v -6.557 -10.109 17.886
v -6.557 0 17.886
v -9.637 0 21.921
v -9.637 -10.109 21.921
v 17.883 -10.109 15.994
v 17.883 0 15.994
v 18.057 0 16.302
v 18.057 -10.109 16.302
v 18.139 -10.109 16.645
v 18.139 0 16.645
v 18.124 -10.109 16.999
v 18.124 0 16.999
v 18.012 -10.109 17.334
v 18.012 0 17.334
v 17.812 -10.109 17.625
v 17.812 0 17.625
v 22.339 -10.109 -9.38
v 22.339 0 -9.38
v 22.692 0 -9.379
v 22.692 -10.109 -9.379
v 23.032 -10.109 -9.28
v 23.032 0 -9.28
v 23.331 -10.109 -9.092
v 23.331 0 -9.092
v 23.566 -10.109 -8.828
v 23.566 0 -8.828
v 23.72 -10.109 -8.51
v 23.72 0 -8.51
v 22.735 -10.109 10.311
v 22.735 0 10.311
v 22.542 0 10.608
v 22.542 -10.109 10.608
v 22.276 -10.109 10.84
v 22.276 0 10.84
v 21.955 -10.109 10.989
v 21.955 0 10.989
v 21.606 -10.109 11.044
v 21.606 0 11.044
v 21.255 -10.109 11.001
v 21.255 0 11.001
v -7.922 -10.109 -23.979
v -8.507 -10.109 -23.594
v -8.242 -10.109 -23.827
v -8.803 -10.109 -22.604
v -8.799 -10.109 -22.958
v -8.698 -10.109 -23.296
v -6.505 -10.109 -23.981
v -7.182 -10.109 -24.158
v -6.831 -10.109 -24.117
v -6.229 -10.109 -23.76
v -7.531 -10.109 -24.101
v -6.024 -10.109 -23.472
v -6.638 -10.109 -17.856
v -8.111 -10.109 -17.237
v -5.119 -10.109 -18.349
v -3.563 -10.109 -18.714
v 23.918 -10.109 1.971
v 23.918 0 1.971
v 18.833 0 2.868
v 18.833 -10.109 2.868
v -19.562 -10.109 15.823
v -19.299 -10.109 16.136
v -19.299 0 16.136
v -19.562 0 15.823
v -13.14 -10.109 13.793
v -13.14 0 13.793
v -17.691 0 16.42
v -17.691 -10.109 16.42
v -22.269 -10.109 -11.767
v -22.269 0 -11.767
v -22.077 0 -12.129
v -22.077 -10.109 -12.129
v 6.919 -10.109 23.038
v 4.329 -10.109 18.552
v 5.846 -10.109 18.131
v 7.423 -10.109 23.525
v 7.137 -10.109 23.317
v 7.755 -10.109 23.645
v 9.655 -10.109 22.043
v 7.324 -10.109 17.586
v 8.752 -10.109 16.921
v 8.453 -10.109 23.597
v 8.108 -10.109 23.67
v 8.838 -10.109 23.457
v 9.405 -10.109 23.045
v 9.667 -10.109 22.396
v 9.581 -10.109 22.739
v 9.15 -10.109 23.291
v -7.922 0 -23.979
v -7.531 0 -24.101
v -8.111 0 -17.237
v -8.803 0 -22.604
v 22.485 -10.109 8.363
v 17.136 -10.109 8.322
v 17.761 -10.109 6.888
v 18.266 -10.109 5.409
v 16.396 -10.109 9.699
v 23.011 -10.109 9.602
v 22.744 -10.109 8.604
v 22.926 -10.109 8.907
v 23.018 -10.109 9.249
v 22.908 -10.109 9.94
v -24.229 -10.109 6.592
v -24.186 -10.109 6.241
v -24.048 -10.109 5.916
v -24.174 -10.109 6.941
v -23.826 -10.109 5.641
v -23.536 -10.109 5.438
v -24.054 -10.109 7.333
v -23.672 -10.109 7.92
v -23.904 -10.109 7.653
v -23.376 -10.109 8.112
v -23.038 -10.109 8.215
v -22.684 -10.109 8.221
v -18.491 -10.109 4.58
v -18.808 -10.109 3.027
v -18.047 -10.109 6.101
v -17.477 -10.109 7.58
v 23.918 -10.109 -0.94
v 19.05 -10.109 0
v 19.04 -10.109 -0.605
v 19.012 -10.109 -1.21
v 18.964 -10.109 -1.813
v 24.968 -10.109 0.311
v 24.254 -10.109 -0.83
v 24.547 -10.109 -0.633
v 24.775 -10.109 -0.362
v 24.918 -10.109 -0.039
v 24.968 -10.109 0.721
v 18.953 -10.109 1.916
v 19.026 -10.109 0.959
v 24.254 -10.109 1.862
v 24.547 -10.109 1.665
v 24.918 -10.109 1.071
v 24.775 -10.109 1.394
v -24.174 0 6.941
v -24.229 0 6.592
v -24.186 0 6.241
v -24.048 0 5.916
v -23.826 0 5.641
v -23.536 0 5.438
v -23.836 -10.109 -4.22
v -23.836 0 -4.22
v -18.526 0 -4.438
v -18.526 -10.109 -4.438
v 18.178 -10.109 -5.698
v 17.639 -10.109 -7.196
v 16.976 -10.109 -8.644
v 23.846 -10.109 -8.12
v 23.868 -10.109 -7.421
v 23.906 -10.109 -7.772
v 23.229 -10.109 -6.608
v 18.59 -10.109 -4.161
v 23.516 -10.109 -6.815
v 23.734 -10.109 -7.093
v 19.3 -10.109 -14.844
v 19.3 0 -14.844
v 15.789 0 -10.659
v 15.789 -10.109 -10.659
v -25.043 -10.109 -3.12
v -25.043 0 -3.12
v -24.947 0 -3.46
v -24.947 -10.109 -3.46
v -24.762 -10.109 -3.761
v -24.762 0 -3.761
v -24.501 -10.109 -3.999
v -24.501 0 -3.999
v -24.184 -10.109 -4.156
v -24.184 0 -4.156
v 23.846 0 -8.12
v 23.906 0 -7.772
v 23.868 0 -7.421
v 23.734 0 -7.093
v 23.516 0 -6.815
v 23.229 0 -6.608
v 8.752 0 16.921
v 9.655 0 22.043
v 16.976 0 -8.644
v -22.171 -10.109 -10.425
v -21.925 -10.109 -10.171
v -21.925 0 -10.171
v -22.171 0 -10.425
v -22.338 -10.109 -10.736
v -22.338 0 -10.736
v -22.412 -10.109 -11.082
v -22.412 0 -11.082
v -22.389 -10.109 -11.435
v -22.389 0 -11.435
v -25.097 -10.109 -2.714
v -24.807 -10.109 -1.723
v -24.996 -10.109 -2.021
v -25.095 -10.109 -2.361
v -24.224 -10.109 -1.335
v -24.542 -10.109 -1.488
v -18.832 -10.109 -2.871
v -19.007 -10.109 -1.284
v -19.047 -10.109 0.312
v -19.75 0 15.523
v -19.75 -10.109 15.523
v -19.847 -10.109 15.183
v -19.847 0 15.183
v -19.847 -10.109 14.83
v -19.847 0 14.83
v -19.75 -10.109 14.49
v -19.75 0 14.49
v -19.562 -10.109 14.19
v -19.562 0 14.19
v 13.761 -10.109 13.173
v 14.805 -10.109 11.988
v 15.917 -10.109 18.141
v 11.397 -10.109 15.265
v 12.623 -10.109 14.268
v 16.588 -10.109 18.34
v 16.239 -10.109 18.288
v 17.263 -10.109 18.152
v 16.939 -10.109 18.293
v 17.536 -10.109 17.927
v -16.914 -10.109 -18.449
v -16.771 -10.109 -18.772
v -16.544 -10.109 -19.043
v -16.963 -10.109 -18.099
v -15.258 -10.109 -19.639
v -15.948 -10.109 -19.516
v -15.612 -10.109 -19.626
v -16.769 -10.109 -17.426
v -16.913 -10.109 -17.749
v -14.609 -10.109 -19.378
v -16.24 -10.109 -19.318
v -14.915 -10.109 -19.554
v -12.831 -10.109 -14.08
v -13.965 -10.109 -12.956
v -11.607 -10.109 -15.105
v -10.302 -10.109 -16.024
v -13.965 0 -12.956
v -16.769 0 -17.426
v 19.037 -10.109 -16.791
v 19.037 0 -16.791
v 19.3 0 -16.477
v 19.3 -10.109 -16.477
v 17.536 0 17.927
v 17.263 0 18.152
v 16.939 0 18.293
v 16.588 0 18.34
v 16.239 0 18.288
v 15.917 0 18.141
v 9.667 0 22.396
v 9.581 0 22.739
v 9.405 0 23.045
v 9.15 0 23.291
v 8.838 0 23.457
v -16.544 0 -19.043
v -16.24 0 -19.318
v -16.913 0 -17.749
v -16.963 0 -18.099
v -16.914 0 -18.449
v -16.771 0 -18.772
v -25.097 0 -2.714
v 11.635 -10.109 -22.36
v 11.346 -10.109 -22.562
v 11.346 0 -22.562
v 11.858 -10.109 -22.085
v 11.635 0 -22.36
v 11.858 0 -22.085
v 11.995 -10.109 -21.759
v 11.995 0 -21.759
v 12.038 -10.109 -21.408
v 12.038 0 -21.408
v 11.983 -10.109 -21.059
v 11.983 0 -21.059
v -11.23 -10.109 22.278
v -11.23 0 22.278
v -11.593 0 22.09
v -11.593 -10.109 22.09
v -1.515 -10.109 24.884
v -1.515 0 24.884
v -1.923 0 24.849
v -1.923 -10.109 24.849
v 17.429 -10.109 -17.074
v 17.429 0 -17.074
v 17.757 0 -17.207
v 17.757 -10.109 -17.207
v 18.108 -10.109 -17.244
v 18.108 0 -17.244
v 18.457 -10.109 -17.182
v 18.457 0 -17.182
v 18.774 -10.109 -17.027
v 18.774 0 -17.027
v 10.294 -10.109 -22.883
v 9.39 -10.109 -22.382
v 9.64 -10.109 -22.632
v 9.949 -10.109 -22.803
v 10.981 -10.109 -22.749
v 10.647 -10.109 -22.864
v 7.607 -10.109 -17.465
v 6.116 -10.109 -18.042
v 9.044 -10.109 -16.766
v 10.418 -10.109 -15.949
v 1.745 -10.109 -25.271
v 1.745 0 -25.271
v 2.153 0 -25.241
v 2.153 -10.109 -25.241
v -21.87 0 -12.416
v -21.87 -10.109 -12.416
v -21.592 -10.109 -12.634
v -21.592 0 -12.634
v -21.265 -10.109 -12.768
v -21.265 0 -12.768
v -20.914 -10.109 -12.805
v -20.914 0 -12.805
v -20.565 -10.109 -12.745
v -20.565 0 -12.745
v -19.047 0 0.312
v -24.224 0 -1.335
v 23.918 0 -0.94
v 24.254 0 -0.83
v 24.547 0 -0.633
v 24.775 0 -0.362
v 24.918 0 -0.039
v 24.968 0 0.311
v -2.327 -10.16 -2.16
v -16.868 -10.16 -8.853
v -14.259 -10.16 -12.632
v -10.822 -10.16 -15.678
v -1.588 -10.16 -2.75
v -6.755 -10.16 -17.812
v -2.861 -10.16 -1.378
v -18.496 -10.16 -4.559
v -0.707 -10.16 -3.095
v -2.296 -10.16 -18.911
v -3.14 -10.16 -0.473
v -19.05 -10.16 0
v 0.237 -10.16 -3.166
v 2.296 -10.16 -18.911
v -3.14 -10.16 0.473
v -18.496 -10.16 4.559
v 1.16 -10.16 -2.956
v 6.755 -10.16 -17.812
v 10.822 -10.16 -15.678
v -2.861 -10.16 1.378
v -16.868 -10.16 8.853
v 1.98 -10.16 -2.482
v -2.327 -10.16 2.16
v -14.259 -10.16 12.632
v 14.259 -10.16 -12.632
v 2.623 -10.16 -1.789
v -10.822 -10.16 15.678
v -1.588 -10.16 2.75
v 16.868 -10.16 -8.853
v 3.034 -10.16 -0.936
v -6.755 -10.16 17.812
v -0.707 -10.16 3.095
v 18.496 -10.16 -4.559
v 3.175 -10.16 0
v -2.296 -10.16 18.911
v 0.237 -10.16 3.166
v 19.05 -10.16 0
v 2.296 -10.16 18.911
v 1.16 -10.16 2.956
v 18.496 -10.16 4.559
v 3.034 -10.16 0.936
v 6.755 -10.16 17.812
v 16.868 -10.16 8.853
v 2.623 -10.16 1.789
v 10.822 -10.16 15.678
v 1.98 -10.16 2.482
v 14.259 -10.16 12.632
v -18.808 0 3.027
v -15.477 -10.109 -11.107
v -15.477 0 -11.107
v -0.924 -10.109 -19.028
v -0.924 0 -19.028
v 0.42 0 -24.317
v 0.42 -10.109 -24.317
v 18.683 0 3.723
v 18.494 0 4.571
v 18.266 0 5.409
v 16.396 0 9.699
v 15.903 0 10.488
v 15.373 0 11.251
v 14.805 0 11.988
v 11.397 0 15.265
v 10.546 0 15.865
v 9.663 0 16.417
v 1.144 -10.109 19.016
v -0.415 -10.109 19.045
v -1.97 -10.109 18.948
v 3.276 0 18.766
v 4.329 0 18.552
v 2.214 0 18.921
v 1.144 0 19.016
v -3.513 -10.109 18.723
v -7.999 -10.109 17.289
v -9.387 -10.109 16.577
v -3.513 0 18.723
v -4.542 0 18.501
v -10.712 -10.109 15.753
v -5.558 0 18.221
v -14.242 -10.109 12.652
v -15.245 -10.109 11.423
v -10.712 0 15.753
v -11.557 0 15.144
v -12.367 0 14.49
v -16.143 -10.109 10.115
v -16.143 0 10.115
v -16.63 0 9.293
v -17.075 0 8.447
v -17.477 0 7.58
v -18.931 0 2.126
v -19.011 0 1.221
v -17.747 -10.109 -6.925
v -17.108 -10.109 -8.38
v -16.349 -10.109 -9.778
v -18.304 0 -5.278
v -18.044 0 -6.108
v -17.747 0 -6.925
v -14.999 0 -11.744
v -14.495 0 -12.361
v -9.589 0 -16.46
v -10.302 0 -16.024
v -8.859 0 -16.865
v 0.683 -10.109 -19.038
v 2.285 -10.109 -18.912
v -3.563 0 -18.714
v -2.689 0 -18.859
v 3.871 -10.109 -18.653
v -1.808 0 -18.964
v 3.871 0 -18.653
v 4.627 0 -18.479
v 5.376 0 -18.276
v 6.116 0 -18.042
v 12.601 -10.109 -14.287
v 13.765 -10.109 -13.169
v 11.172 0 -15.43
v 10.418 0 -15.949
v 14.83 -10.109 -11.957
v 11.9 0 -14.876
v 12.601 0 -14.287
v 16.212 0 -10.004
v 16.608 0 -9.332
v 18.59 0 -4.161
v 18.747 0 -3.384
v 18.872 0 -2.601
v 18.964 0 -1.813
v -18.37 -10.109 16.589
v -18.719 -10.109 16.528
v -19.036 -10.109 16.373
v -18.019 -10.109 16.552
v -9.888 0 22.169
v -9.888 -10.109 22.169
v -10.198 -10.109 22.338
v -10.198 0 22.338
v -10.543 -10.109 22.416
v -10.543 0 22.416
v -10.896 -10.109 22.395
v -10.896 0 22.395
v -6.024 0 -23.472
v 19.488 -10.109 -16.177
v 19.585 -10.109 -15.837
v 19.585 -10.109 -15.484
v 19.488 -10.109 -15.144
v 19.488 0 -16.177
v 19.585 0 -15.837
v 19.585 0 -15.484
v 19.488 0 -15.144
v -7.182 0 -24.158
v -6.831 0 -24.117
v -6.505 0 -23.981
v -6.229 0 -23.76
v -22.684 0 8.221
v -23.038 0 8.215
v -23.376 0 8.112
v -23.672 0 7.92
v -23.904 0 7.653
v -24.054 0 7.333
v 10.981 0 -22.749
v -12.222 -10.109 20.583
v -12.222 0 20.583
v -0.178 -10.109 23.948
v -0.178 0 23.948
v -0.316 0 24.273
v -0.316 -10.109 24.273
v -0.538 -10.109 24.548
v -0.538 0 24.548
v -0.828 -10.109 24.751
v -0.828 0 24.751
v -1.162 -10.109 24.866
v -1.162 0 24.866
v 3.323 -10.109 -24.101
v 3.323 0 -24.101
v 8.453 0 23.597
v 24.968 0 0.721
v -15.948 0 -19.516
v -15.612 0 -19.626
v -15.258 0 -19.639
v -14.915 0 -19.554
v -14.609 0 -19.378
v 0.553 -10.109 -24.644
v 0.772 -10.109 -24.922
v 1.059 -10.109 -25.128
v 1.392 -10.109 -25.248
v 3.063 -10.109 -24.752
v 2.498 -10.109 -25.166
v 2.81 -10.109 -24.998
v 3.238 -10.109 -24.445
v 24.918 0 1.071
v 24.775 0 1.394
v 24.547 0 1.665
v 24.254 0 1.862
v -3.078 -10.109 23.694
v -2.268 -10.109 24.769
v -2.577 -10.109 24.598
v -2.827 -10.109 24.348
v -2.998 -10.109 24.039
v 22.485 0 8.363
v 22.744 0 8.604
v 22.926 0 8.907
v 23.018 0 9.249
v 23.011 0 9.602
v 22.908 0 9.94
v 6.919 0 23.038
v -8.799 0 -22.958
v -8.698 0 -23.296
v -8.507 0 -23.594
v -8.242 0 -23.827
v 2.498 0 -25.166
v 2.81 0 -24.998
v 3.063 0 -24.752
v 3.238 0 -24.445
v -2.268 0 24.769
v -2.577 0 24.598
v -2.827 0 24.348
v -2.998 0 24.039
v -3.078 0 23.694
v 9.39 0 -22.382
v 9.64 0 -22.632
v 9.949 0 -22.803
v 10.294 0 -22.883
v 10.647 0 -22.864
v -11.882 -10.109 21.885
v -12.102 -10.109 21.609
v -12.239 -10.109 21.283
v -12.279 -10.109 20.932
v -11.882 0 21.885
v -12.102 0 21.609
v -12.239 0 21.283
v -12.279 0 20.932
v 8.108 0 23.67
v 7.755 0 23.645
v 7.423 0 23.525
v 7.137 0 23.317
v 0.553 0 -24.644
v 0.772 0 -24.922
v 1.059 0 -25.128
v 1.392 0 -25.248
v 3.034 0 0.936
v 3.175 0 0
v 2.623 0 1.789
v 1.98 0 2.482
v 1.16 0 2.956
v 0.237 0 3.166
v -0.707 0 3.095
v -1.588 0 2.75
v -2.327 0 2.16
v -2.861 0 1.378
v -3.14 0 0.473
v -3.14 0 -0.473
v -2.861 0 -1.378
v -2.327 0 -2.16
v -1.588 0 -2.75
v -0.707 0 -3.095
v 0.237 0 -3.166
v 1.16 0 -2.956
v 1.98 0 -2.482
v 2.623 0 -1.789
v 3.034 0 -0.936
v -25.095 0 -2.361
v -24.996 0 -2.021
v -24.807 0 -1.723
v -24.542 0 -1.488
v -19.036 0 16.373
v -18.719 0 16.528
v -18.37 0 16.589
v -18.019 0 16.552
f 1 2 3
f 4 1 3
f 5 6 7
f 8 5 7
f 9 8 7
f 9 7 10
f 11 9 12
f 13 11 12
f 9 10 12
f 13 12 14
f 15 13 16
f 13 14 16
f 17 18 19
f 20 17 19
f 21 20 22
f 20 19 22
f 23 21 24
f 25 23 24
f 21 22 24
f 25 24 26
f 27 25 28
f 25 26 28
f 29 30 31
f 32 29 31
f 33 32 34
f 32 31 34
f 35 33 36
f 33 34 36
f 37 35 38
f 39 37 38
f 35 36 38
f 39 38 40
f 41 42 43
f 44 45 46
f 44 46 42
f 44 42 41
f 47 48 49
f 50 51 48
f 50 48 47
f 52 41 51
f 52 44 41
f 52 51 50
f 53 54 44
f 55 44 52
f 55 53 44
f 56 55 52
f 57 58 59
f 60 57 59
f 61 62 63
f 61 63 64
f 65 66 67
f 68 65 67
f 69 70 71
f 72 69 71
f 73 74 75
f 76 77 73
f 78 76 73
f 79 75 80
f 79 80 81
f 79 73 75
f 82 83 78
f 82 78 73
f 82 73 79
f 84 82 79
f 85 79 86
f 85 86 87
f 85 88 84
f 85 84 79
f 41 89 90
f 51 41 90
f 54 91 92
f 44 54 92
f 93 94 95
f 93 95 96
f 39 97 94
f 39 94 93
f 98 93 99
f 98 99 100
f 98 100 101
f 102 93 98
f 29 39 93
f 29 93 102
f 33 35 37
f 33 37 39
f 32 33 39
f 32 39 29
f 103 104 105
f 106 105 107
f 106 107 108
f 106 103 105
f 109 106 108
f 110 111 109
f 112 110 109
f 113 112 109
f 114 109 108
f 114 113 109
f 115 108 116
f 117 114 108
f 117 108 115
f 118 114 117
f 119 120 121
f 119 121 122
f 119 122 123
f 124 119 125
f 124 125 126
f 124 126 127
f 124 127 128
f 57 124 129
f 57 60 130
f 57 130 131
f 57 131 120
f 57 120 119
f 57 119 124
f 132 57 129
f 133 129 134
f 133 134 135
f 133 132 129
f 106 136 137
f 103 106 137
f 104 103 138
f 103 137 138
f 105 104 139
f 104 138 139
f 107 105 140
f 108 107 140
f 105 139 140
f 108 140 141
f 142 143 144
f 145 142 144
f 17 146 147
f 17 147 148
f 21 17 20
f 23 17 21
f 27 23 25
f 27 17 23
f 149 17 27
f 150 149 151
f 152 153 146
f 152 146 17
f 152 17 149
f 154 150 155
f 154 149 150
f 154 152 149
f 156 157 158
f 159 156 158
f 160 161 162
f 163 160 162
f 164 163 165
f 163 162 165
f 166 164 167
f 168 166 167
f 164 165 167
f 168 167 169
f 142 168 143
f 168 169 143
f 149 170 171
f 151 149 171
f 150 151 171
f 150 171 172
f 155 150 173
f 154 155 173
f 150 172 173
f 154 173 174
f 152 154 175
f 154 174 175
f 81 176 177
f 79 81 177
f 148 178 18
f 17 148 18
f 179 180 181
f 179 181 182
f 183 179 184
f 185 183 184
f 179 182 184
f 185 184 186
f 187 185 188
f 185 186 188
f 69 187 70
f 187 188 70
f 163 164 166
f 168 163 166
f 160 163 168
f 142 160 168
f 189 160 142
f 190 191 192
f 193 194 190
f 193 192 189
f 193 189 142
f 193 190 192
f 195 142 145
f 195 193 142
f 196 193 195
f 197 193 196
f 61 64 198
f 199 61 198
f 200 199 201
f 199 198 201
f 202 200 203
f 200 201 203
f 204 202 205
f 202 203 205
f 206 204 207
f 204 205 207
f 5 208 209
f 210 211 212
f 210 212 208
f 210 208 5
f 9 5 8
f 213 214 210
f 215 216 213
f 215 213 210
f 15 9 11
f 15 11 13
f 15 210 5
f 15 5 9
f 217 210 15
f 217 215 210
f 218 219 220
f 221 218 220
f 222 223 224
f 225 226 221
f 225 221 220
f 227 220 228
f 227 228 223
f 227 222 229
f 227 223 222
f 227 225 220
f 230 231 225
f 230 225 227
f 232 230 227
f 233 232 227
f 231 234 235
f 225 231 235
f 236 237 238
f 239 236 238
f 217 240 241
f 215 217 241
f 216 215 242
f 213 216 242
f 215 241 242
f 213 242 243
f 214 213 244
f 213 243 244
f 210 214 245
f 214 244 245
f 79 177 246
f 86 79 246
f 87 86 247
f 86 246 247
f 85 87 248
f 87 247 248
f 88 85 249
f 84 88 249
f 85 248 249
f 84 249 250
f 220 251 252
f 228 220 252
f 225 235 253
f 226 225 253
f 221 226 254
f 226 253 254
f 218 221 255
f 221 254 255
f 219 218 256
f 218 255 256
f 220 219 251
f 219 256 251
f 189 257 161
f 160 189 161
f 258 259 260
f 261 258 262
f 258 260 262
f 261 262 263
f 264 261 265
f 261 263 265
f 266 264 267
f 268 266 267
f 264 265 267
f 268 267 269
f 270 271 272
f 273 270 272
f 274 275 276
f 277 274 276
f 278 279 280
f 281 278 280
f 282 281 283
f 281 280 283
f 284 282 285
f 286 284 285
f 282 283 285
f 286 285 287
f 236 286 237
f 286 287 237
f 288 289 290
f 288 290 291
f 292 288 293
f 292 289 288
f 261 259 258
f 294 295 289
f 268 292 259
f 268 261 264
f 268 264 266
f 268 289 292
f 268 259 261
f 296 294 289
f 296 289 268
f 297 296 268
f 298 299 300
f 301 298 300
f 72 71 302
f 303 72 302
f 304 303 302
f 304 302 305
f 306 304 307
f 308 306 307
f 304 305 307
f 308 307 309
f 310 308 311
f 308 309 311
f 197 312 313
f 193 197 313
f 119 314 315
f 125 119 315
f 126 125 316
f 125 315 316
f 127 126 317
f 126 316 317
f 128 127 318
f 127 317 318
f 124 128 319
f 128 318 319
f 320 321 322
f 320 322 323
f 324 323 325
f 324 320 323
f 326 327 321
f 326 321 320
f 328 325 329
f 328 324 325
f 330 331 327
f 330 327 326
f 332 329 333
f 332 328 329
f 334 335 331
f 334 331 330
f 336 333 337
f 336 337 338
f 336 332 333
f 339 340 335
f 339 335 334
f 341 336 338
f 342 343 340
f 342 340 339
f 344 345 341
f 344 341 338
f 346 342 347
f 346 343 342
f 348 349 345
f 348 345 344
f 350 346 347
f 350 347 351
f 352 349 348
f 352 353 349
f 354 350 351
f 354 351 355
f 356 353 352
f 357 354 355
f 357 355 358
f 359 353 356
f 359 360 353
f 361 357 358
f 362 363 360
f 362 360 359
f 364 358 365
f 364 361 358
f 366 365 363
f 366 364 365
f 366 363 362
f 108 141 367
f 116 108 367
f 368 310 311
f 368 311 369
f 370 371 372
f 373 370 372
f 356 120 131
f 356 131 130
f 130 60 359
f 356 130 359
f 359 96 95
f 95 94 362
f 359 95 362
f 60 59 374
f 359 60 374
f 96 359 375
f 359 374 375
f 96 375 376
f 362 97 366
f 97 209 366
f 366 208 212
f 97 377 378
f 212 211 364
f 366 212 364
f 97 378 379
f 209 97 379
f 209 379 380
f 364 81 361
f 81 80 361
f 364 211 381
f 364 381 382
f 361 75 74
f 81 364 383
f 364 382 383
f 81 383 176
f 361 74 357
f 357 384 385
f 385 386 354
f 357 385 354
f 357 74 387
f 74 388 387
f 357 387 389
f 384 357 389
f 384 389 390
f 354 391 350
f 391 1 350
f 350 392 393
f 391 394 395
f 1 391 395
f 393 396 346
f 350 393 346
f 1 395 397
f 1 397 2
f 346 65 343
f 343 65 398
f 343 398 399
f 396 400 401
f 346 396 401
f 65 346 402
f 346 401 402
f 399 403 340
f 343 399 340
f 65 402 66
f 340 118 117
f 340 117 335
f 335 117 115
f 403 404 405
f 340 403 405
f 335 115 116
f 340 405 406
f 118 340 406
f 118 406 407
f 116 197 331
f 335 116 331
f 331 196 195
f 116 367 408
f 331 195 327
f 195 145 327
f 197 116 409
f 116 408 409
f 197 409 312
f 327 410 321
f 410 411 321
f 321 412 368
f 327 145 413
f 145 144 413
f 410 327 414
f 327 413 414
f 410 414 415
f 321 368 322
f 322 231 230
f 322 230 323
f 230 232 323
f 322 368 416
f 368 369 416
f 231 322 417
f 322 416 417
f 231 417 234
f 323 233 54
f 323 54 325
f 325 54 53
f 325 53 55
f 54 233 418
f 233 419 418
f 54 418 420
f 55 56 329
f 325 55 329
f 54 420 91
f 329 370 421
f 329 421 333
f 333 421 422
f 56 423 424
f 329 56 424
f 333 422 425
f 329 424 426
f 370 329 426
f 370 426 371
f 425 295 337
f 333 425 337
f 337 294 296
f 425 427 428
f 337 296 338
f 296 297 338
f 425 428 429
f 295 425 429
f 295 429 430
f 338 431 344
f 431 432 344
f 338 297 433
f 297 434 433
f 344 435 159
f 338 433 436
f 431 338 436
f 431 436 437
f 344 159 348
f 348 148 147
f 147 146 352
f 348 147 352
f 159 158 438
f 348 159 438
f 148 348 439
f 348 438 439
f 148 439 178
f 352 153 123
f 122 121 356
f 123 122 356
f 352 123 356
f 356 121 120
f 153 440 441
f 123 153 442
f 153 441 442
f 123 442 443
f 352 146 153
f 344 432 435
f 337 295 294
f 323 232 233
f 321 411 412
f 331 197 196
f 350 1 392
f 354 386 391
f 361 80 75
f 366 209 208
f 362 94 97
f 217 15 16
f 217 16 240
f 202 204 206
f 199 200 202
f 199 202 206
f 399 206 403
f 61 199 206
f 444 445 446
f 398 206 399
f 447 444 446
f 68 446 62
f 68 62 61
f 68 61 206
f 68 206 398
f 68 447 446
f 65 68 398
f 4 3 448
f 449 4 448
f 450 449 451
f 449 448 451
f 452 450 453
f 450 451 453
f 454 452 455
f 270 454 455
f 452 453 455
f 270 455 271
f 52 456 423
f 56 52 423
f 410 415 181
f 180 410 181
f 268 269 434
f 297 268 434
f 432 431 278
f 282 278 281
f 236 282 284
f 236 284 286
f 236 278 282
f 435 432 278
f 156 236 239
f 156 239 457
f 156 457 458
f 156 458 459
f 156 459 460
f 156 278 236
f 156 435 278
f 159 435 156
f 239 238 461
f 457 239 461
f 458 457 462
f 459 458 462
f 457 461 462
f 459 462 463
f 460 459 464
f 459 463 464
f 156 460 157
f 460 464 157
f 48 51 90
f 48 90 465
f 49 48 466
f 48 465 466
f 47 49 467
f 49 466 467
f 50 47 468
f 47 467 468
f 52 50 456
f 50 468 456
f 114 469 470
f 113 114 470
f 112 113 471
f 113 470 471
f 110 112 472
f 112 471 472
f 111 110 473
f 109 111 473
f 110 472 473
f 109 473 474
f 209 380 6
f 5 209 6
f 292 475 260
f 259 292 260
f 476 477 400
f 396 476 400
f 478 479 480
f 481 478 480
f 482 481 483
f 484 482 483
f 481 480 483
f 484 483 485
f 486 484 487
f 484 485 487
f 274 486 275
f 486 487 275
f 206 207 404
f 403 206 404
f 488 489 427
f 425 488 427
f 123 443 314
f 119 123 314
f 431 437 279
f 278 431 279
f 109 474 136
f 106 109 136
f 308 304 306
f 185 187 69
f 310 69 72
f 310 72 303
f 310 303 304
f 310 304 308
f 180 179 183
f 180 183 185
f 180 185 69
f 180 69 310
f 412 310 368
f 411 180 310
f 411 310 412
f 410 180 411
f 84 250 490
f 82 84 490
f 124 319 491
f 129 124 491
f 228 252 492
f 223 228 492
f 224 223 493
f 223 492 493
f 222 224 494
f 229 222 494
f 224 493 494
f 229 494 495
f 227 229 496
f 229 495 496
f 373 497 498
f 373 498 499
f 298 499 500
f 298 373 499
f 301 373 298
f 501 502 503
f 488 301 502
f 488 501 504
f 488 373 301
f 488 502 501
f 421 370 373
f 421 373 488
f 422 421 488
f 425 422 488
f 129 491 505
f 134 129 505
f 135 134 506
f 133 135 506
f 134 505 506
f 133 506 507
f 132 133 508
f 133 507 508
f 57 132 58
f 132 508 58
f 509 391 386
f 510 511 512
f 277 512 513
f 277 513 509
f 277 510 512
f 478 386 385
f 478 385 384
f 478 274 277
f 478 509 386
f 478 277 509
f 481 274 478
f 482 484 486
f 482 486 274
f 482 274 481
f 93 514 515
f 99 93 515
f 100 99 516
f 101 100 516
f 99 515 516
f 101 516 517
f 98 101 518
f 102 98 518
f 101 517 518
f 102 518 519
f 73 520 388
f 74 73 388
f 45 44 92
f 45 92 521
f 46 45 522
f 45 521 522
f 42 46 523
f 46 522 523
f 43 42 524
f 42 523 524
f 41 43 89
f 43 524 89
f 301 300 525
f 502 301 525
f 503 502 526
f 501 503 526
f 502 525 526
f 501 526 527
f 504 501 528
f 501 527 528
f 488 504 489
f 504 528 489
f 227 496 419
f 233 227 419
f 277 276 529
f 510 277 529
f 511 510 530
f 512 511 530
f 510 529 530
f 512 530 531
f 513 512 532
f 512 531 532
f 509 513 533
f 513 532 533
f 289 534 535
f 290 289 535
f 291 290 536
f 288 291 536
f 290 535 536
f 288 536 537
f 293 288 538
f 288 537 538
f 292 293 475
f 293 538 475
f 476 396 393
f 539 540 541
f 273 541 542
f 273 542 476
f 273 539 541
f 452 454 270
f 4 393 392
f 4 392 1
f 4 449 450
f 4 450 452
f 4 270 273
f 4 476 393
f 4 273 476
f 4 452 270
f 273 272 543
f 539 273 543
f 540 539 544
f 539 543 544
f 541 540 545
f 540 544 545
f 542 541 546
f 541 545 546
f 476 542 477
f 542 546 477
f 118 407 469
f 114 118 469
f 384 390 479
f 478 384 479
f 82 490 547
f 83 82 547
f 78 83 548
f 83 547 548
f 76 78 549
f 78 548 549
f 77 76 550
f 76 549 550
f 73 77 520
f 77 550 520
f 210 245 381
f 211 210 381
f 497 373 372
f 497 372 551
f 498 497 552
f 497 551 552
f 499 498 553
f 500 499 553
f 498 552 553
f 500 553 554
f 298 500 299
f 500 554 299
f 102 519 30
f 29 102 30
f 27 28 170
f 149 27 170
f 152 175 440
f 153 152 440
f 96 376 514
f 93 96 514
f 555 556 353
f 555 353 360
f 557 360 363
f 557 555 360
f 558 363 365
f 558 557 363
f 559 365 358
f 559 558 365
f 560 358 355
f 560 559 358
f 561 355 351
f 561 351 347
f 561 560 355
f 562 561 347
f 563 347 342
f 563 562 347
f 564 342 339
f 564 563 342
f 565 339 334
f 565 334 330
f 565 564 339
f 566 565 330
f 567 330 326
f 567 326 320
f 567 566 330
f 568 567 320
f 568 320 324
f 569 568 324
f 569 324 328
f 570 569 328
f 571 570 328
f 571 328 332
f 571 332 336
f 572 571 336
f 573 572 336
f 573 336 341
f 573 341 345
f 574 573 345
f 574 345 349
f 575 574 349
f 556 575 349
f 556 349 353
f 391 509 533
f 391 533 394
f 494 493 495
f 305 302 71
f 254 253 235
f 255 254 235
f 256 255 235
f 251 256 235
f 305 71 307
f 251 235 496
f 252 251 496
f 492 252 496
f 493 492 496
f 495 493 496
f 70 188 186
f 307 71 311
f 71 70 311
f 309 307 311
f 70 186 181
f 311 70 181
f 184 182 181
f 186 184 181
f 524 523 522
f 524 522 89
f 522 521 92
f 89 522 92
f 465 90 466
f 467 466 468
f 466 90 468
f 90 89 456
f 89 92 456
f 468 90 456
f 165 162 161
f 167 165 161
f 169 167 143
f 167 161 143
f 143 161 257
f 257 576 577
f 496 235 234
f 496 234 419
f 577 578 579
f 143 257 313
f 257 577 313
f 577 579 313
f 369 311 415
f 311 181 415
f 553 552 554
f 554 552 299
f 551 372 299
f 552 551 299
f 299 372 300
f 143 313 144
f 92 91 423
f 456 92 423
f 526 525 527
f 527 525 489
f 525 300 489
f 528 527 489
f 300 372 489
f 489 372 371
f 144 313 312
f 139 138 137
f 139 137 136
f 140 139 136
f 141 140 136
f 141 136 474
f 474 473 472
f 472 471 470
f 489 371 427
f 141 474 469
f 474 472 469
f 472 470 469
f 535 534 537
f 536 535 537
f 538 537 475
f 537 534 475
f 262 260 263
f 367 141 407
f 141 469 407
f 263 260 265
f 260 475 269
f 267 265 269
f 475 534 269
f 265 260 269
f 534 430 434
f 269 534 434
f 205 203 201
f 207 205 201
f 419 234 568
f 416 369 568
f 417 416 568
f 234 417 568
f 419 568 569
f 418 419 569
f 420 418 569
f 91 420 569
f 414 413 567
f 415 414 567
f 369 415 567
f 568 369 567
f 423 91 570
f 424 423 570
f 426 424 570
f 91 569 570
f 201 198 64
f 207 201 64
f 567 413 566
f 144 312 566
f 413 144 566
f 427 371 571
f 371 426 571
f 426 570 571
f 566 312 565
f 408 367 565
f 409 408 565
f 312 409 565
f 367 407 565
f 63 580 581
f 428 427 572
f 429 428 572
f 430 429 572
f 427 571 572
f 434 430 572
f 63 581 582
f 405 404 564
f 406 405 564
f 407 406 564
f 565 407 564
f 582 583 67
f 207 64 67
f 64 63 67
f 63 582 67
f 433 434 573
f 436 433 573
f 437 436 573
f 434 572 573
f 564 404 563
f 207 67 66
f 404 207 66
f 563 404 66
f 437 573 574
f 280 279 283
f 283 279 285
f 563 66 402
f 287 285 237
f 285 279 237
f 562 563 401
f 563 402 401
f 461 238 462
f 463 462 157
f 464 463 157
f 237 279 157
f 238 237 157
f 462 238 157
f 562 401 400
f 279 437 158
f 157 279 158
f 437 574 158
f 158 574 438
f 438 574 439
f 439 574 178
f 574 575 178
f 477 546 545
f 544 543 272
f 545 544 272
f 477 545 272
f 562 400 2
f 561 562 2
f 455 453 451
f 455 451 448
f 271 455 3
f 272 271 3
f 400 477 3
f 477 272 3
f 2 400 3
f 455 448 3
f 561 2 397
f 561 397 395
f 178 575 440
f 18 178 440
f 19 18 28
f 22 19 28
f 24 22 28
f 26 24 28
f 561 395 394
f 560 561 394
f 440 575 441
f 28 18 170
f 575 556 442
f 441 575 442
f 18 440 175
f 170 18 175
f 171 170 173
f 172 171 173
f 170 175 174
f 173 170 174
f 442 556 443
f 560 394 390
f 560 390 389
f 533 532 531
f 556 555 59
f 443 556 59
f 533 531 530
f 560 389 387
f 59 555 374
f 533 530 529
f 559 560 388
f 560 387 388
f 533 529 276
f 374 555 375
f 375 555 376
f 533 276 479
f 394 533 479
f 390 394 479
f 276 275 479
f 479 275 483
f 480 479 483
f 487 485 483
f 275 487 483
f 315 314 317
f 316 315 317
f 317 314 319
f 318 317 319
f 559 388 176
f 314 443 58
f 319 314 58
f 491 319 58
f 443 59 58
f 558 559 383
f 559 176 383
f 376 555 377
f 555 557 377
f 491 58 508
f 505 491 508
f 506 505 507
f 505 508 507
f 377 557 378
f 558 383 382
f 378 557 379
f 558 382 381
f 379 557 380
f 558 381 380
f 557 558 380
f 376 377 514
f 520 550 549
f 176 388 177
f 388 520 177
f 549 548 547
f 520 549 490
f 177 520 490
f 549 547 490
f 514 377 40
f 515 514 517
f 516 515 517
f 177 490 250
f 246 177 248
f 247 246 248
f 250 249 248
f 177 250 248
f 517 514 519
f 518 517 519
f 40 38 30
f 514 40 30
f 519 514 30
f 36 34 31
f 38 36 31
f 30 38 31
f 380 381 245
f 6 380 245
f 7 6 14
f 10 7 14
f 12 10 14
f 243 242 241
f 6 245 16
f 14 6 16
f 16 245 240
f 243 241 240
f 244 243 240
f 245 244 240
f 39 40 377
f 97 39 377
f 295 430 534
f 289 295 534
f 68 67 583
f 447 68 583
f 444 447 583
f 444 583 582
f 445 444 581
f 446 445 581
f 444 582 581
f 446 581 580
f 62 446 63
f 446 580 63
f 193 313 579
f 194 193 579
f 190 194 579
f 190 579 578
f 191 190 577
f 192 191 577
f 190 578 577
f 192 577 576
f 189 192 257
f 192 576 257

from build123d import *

# Parameters (mm, degrees)
F0_R     = 19.05
F0_R_2   = 3.175
F1_DEPTH = 3.81
F3_DEPTH = 3.7338
F5_DEPTH = 6.35
F6_DEPTH = 10.1092


with BuildPart() as f1:
    # F0 (on Front) → F1 (new body)
    with BuildSketch(Plane.XZ):
        Circle(F0_R)
        Circle(F0_R_2, mode=Mode.SUBTRACT)
    extrude(amount=F1_DEPTH)

    # F2 (on Front) → F3, piece 2 (join)
    with BuildSketch(Plane.XZ):
        with BuildLine():
            Line((19.3002153026, -14.8442822065), (15.2105484158, -9.9704070017))
            Line((15.2105484158, -9.9704070017), (11.9190644701, -13.8930448189))
            Line((11.9190644701, -13.8930448189), (17.4290577612, -17.0742409287))
            ThreePointArc((17.4290577612, -17.0742409287), (18.2845909468, -17.2250945122), (19.036934204, -16.7907289302))
            Line((19.036934204, -16.7907289302), (19.3002153026, -16.4769627351))
            ThreePointArc((19.3002153026, -16.4769627351), (19.5973388598, -15.6606224708), (19.3002153026, -14.8442822065))
        make_face()
        with BuildLine():
            Line((11.9828917218, -21.0592770188), (10.1196430624, -14.9758290499))
            Line((10.1196430624, -14.9758290499), (5.5582912351, -17.3028493588))
            Line((5.5582912351, -17.3028493588), (9.3898339973, -22.3821519505))
            ThreePointArc((9.3898339973, -22.3821519505), (10.1186515435, -22.8549297204), (10.9808538675, -22.7486236155))
            Line((10.9808538675, -22.7486236155), (11.3457098838, -22.5624885854))
            ThreePointArc((11.3457098838, -22.5624885854), (11.9378629358, -21.9268404135), (11.9828917218, -21.0592770188))
        make_face()
        with BuildLine():
            Line((3.3225191024, -24.1014032107), (3.9599463344, -17.7710223943))
            Line((3.9599463344, -17.7710223943), (-1.1466123432, -18.1505121598))
            Line((-1.1466123432, -18.1505121598), (0.4195197448, -24.3171372529))
            ThreePointArc((0.4195197448, -24.3171372529), (0.9084468903, -25.0352208705), (1.7445620653, -25.2710285242))
            Line((1.7445620653, -25.2710285242), (2.1530283986, -25.24067368))
            ThreePointArc((2.1530283986, -25.24067368), (2.9451040203, -24.8838683481), (3.3225191024, -24.1014032107))
        make_face()
        with BuildLine():
            Line((-6.024496716, -23.4720864394), (-3.1015451532, -17.8208574653))
            Line((-3.1015451532, -17.8208574653), (-7.9892249639, -16.2939193272))
            Line((-7.9892249639, -16.2939193272), (-8.8030668347, -22.604045805))
            ThreePointArc((-8.8030668347, -22.604045805), (-8.6128057983, -23.4516863972), (-7.9222045185, -23.9787193257))
            Line((-7.9222045185, -23.9787193257), (-7.531245993, -24.100856926))
            ThreePointArc((-7.531245993, -24.100856926), (-6.6634444839, -24.0606776264), (-6.024496716, -23.4720864394))
        make_face()
        with BuildLine():
            Line((-14.6087634205, -19.377536382), (-9.5885228366, -15.4689280316))
            Line((-9.5885228366, -15.4689280316), (-13.3881088706, -12.0361303417))
            Line((-13.3881088706, -12.0361303417), (-16.7687691136, -17.4260441702))
            ThreePointArc((-16.7687691136, -17.4260441702), (-16.9508230748, -18.275485275), (-16.5442742828, -19.0432169437))
            Line((-16.5442742828, -19.0432169437), (-16.2403508241, -19.3178015268))
            ThreePointArc((-16.2403508241, -19.3178015268), (-15.4354279769, -19.6445935792), (-14.6087634205, -19.377536382))
        make_face()
        with BuildLine():
            Line((-20.5652638633, -12.7449498911), (-14.5090268925, -10.7950707898))
            Line((-14.5090268925, -10.7950707898), (-16.9009077473, -6.2673936827))
            Line((-16.9009077473, -6.2673936827), (-21.9250110088, -10.1710357224))
            ThreePointArc((-21.9250110088, -10.1710357224), (-22.3873392768, -10.9065263124), (-22.2687390391, -11.7671236741))
            Line((-22.2687390391, -11.7671236741), (-22.0774159066, -12.1292860977))
            ThreePointArc((-22.0774159066, -12.1292860977), (-21.4333815325, -12.7123071611), (-20.5652638633, -12.7449498911))
        make_face()
        with BuildLine():
            Line((-23.8361925967, -4.2197788404), (-17.4791440368, -4.48048627))
            Line((-17.4791440368, -4.48048627), (-18.1609497484, 0.5945600333))
            Line((-18.1609497484, 0.5945600333), (-24.2237885625, -1.3346937785))
            ThreePointArc((-24.2237885625, -1.3346937785), (-24.9115978854, -1.8653652124), (-25.0973813726, -2.713998426))
            Line((-25.0973813726, -2.713998426), (-25.0428447078, -3.1199441296))
            ThreePointArc((-25.0428447078, -3.1199441296), (-24.6396722009, -3.8894542108), (-23.8361925967, -4.2197788404))
        make_face()
        with BuildLine():
            Line((-23.5361590974, 5.4379167113), (-17.8682561964, 2.5474303402))
            Line((-17.8682561964, 2.5474303402), (-16.3693803408, 7.4437886991))
            Line((-16.3693803408, 7.4437886991), (-22.6840714351, 8.2214204499))
            ThreePointArc((-22.6840714351, 8.2214204499), (-23.5306066884, 8.0263002296), (-24.053669455, 7.3326870971))
            Line((-24.053669455, 7.3326870971), (-24.1735623934, 6.9410343869))
            ThreePointArc((-24.1735623934, 6.9410343869), (-24.1284057917, 6.0734776356), (-23.5361590974, 5.4379167113))
        make_face()
        with BuildLine():
            Line((-19.5623090328, 14.1900364797), (-15.4726421461, 9.3161612749))
            Line((-15.4726421461, 9.3161612749), (-12.1811582004, 13.2387990921))
            Line((-12.1811582004, 13.2387990921), (-17.6911514915, 16.419995202))
            ThreePointArc((-17.6911514915, 16.419995202), (-18.5466846771, 16.5708487855), (-19.2990279342, 16.1364832035))
            Line((-19.2990279342, 16.1364832035), (-19.5623090328, 15.8227170083))
            ThreePointArc((-19.5623090328, 15.8227170083), (-19.8594325901, 15.006376744), (-19.5623090328, 14.1900364797))
        make_face()
        with BuildLine():
            Line((-12.2220281822, 20.5830006913), (-10.324199684, 14.5102515817))
            Line((-10.324199684, 14.5102515817), (-5.7761605757, 16.8631847042))
            Line((-5.7761605757, 16.8631847042), (-9.6365385319, 21.9206066554))
            ThreePointArc((-9.6365385319, 21.9206066554), (-10.3680340136, 22.3892303804), (-11.2296175865, 22.2780207486))
            Line((-11.2296175865, 22.2780207486), (-11.5934087375, 22.0898129895))
            ThreePointArc((-11.5934087375, 22.0898129895), (-12.1819358724, 21.4508062237), (-12.2220281822, 20.5830006913))
        make_face()
        with BuildLine():
            Line((-3.0776811638, 23.6942735067), (-3.6322001833, 17.3560921103))
            Line((-3.6322001833, 17.3560921103), (1.4689542355, 17.8023852928))
            Line((1.4689542355, 17.8023852928), (-0.1777540434, 23.9479842548))
            ThreePointArc((-0.1777540434, 23.9479842548), (-0.6760377686, 24.6596071637), (-1.5151676361, 24.8844513341))
            Line((-1.5151676361, 24.8844513341), (-1.9232016905, 24.84875298))
            ThreePointArc((-1.9232016905, 24.84875298), (-2.7105395093, 24.4816113255), (-3.0776811638, 23.6942735067))
        make_face()
        with BuildLine():
            Line((6.9191977973, 23.0382329287), (3.7380016875, 17.5282396376))
            Line((3.7380016875, 17.5282396376), (8.5498293092, 15.7768776109))
            Line((8.5498293092, 15.7768776109), (9.6546471237, 22.0426107965))
            ThreePointArc((9.6546471237, 22.0426107965), (9.5037935402, 22.8981439822), (8.8383068594, 23.4565536106))
            Line((8.8383068594, 23.4565536106), (8.4534156421, 23.5966425571))
            ThreePointArc((8.4534156421, 23.5966425571), (7.5846844781, 23.5966425571), (6.9191977973, 23.0382329287))
        make_face()
        with BuildLine():
            Line((15.9169355088, 18.1412522665), (10.5493562296, 14.7252418101))
            Line((10.5493562296, 14.7252418101), (14.0070511629, 10.9482986337))
            Line((14.0070511629, 10.9482986337), (17.8825814171, 15.9941186865))
            ThreePointArc((17.8825814171, 15.9941186865), (18.1441998983, 16.8225205248), (17.8121248444, 17.6252782679))
            Line((17.8121248444, 17.6252782679), (17.5355487664, 17.9273905568))
            ThreePointArc((17.5355487664, 17.9273905568), (16.7651617859, 18.328884935), (15.9169355088, 18.1412522665))
        make_face()
        with BuildLine():
            Line((21.2552525466, 11.001283816), (15.1096535847, 9.3545755371))
            Line((15.1096535847, 9.3545755371), (17.2737295605, 4.7136996305))
            Line((17.2737295605, 4.7136996305), (22.4854961538, 8.3630178866))
            ThreePointArc((22.4854961538, 8.3630178866), (22.983779879, 9.0746407955), (22.9080649691, 9.9400661752))
            Line((22.9080649691, 9.9400661752), (22.7349636234, 10.311283209))
            ThreePointArc((22.7349636234, 10.311283209), (22.1206779263, 10.9255689062), (21.2552525466, 11.001283816))
        make_face()
        with BuildLine():
            Line((23.9182224306, 1.9714912908), (17.6524892449, 3.0763091054))
            Line((17.6524892449, 3.0763091054), (17.6524892449, -2.0443308946))
            Line((17.6524892449, -2.0443308946), (23.9182224306, -0.9395130801))
            ThreePointArc((23.9182224306, -0.9395130801), (24.6705656877, -0.505147498), (24.9676892449, 0.3111927663))
            Line((24.9676892449, 0.3111927663), (24.9676892449, 0.7207854445))
            ThreePointArc((24.9676892449, 0.7207854445), (24.6705656877, 1.5371257088), (23.9182224306, 1.9714912908))
        make_face()
        with BuildLine():
            Line((23.229211427, -6.6084690539), (17.6019985229, -3.6395450588))
            Line((17.6019985229, -3.6395450588), (16.0352661171, -8.5146146561))
            Line((16.0352661171, -8.5146146561), (22.338548369, -9.379870462))
            ThreePointArc((22.338548369, -9.379870462), (23.1877118276, -9.196525825), (23.7203571155, -8.5102439349))
            Line((23.7203571155, -8.5102439349), (23.8456778024, -8.1202940823))
            ThreePointArc((23.8456778024, -8.1202940823), (23.8125742696, -7.2521938626), (23.229211427, -6.6084690539))
        make_face()
    extrude(amount=F3_DEPTH)

    # F5 (add): a face of the model
    f5_faces = [f1.faces().sort_by_distance(p)[0] for p in [
        (-18.5111846327, -3.81, 0),
    ]]
    extrude(f5_faces, amount=F5_DEPTH)

    # F6 (add): a face of the model
    f6_faces = [f1.faces().sort_by_distance(p)[0] for p in [
        (24.1275892459, 0, -0.049536166),
    ]]
    extrude(f6_faces, amount=-F6_DEPTH)


with BuildPart() as f3:
    # F2 (on Front) → F3 (new body)
    with BuildSketch(Plane.XZ):
        with BuildLine():
            Line((-44.3880631869, 14.6072879799), (-45.4928810014, 8.3415547942))
            Line((-45.4928810014, 8.3415547942), (-40.3722410014, 8.3415547942))
            Line((-40.3722410014, 8.3415547942), (-41.477058816, 14.6072879799))
            ThreePointArc((-41.477058816, 14.6072879799), (-41.911424398, 15.359631237), (-42.7277646623, 15.6567547942))
            Line((-42.7277646623, 15.6567547942), (-43.1373573405, 15.6567547942))
            ThreePointArc((-43.1373573405, 15.6567547942), (-43.9536976048, 15.359631237), (-44.3880631869, 14.6072879799))
        make_face()
    extrude(amount=F3_DEPTH)


solid = f1.part
